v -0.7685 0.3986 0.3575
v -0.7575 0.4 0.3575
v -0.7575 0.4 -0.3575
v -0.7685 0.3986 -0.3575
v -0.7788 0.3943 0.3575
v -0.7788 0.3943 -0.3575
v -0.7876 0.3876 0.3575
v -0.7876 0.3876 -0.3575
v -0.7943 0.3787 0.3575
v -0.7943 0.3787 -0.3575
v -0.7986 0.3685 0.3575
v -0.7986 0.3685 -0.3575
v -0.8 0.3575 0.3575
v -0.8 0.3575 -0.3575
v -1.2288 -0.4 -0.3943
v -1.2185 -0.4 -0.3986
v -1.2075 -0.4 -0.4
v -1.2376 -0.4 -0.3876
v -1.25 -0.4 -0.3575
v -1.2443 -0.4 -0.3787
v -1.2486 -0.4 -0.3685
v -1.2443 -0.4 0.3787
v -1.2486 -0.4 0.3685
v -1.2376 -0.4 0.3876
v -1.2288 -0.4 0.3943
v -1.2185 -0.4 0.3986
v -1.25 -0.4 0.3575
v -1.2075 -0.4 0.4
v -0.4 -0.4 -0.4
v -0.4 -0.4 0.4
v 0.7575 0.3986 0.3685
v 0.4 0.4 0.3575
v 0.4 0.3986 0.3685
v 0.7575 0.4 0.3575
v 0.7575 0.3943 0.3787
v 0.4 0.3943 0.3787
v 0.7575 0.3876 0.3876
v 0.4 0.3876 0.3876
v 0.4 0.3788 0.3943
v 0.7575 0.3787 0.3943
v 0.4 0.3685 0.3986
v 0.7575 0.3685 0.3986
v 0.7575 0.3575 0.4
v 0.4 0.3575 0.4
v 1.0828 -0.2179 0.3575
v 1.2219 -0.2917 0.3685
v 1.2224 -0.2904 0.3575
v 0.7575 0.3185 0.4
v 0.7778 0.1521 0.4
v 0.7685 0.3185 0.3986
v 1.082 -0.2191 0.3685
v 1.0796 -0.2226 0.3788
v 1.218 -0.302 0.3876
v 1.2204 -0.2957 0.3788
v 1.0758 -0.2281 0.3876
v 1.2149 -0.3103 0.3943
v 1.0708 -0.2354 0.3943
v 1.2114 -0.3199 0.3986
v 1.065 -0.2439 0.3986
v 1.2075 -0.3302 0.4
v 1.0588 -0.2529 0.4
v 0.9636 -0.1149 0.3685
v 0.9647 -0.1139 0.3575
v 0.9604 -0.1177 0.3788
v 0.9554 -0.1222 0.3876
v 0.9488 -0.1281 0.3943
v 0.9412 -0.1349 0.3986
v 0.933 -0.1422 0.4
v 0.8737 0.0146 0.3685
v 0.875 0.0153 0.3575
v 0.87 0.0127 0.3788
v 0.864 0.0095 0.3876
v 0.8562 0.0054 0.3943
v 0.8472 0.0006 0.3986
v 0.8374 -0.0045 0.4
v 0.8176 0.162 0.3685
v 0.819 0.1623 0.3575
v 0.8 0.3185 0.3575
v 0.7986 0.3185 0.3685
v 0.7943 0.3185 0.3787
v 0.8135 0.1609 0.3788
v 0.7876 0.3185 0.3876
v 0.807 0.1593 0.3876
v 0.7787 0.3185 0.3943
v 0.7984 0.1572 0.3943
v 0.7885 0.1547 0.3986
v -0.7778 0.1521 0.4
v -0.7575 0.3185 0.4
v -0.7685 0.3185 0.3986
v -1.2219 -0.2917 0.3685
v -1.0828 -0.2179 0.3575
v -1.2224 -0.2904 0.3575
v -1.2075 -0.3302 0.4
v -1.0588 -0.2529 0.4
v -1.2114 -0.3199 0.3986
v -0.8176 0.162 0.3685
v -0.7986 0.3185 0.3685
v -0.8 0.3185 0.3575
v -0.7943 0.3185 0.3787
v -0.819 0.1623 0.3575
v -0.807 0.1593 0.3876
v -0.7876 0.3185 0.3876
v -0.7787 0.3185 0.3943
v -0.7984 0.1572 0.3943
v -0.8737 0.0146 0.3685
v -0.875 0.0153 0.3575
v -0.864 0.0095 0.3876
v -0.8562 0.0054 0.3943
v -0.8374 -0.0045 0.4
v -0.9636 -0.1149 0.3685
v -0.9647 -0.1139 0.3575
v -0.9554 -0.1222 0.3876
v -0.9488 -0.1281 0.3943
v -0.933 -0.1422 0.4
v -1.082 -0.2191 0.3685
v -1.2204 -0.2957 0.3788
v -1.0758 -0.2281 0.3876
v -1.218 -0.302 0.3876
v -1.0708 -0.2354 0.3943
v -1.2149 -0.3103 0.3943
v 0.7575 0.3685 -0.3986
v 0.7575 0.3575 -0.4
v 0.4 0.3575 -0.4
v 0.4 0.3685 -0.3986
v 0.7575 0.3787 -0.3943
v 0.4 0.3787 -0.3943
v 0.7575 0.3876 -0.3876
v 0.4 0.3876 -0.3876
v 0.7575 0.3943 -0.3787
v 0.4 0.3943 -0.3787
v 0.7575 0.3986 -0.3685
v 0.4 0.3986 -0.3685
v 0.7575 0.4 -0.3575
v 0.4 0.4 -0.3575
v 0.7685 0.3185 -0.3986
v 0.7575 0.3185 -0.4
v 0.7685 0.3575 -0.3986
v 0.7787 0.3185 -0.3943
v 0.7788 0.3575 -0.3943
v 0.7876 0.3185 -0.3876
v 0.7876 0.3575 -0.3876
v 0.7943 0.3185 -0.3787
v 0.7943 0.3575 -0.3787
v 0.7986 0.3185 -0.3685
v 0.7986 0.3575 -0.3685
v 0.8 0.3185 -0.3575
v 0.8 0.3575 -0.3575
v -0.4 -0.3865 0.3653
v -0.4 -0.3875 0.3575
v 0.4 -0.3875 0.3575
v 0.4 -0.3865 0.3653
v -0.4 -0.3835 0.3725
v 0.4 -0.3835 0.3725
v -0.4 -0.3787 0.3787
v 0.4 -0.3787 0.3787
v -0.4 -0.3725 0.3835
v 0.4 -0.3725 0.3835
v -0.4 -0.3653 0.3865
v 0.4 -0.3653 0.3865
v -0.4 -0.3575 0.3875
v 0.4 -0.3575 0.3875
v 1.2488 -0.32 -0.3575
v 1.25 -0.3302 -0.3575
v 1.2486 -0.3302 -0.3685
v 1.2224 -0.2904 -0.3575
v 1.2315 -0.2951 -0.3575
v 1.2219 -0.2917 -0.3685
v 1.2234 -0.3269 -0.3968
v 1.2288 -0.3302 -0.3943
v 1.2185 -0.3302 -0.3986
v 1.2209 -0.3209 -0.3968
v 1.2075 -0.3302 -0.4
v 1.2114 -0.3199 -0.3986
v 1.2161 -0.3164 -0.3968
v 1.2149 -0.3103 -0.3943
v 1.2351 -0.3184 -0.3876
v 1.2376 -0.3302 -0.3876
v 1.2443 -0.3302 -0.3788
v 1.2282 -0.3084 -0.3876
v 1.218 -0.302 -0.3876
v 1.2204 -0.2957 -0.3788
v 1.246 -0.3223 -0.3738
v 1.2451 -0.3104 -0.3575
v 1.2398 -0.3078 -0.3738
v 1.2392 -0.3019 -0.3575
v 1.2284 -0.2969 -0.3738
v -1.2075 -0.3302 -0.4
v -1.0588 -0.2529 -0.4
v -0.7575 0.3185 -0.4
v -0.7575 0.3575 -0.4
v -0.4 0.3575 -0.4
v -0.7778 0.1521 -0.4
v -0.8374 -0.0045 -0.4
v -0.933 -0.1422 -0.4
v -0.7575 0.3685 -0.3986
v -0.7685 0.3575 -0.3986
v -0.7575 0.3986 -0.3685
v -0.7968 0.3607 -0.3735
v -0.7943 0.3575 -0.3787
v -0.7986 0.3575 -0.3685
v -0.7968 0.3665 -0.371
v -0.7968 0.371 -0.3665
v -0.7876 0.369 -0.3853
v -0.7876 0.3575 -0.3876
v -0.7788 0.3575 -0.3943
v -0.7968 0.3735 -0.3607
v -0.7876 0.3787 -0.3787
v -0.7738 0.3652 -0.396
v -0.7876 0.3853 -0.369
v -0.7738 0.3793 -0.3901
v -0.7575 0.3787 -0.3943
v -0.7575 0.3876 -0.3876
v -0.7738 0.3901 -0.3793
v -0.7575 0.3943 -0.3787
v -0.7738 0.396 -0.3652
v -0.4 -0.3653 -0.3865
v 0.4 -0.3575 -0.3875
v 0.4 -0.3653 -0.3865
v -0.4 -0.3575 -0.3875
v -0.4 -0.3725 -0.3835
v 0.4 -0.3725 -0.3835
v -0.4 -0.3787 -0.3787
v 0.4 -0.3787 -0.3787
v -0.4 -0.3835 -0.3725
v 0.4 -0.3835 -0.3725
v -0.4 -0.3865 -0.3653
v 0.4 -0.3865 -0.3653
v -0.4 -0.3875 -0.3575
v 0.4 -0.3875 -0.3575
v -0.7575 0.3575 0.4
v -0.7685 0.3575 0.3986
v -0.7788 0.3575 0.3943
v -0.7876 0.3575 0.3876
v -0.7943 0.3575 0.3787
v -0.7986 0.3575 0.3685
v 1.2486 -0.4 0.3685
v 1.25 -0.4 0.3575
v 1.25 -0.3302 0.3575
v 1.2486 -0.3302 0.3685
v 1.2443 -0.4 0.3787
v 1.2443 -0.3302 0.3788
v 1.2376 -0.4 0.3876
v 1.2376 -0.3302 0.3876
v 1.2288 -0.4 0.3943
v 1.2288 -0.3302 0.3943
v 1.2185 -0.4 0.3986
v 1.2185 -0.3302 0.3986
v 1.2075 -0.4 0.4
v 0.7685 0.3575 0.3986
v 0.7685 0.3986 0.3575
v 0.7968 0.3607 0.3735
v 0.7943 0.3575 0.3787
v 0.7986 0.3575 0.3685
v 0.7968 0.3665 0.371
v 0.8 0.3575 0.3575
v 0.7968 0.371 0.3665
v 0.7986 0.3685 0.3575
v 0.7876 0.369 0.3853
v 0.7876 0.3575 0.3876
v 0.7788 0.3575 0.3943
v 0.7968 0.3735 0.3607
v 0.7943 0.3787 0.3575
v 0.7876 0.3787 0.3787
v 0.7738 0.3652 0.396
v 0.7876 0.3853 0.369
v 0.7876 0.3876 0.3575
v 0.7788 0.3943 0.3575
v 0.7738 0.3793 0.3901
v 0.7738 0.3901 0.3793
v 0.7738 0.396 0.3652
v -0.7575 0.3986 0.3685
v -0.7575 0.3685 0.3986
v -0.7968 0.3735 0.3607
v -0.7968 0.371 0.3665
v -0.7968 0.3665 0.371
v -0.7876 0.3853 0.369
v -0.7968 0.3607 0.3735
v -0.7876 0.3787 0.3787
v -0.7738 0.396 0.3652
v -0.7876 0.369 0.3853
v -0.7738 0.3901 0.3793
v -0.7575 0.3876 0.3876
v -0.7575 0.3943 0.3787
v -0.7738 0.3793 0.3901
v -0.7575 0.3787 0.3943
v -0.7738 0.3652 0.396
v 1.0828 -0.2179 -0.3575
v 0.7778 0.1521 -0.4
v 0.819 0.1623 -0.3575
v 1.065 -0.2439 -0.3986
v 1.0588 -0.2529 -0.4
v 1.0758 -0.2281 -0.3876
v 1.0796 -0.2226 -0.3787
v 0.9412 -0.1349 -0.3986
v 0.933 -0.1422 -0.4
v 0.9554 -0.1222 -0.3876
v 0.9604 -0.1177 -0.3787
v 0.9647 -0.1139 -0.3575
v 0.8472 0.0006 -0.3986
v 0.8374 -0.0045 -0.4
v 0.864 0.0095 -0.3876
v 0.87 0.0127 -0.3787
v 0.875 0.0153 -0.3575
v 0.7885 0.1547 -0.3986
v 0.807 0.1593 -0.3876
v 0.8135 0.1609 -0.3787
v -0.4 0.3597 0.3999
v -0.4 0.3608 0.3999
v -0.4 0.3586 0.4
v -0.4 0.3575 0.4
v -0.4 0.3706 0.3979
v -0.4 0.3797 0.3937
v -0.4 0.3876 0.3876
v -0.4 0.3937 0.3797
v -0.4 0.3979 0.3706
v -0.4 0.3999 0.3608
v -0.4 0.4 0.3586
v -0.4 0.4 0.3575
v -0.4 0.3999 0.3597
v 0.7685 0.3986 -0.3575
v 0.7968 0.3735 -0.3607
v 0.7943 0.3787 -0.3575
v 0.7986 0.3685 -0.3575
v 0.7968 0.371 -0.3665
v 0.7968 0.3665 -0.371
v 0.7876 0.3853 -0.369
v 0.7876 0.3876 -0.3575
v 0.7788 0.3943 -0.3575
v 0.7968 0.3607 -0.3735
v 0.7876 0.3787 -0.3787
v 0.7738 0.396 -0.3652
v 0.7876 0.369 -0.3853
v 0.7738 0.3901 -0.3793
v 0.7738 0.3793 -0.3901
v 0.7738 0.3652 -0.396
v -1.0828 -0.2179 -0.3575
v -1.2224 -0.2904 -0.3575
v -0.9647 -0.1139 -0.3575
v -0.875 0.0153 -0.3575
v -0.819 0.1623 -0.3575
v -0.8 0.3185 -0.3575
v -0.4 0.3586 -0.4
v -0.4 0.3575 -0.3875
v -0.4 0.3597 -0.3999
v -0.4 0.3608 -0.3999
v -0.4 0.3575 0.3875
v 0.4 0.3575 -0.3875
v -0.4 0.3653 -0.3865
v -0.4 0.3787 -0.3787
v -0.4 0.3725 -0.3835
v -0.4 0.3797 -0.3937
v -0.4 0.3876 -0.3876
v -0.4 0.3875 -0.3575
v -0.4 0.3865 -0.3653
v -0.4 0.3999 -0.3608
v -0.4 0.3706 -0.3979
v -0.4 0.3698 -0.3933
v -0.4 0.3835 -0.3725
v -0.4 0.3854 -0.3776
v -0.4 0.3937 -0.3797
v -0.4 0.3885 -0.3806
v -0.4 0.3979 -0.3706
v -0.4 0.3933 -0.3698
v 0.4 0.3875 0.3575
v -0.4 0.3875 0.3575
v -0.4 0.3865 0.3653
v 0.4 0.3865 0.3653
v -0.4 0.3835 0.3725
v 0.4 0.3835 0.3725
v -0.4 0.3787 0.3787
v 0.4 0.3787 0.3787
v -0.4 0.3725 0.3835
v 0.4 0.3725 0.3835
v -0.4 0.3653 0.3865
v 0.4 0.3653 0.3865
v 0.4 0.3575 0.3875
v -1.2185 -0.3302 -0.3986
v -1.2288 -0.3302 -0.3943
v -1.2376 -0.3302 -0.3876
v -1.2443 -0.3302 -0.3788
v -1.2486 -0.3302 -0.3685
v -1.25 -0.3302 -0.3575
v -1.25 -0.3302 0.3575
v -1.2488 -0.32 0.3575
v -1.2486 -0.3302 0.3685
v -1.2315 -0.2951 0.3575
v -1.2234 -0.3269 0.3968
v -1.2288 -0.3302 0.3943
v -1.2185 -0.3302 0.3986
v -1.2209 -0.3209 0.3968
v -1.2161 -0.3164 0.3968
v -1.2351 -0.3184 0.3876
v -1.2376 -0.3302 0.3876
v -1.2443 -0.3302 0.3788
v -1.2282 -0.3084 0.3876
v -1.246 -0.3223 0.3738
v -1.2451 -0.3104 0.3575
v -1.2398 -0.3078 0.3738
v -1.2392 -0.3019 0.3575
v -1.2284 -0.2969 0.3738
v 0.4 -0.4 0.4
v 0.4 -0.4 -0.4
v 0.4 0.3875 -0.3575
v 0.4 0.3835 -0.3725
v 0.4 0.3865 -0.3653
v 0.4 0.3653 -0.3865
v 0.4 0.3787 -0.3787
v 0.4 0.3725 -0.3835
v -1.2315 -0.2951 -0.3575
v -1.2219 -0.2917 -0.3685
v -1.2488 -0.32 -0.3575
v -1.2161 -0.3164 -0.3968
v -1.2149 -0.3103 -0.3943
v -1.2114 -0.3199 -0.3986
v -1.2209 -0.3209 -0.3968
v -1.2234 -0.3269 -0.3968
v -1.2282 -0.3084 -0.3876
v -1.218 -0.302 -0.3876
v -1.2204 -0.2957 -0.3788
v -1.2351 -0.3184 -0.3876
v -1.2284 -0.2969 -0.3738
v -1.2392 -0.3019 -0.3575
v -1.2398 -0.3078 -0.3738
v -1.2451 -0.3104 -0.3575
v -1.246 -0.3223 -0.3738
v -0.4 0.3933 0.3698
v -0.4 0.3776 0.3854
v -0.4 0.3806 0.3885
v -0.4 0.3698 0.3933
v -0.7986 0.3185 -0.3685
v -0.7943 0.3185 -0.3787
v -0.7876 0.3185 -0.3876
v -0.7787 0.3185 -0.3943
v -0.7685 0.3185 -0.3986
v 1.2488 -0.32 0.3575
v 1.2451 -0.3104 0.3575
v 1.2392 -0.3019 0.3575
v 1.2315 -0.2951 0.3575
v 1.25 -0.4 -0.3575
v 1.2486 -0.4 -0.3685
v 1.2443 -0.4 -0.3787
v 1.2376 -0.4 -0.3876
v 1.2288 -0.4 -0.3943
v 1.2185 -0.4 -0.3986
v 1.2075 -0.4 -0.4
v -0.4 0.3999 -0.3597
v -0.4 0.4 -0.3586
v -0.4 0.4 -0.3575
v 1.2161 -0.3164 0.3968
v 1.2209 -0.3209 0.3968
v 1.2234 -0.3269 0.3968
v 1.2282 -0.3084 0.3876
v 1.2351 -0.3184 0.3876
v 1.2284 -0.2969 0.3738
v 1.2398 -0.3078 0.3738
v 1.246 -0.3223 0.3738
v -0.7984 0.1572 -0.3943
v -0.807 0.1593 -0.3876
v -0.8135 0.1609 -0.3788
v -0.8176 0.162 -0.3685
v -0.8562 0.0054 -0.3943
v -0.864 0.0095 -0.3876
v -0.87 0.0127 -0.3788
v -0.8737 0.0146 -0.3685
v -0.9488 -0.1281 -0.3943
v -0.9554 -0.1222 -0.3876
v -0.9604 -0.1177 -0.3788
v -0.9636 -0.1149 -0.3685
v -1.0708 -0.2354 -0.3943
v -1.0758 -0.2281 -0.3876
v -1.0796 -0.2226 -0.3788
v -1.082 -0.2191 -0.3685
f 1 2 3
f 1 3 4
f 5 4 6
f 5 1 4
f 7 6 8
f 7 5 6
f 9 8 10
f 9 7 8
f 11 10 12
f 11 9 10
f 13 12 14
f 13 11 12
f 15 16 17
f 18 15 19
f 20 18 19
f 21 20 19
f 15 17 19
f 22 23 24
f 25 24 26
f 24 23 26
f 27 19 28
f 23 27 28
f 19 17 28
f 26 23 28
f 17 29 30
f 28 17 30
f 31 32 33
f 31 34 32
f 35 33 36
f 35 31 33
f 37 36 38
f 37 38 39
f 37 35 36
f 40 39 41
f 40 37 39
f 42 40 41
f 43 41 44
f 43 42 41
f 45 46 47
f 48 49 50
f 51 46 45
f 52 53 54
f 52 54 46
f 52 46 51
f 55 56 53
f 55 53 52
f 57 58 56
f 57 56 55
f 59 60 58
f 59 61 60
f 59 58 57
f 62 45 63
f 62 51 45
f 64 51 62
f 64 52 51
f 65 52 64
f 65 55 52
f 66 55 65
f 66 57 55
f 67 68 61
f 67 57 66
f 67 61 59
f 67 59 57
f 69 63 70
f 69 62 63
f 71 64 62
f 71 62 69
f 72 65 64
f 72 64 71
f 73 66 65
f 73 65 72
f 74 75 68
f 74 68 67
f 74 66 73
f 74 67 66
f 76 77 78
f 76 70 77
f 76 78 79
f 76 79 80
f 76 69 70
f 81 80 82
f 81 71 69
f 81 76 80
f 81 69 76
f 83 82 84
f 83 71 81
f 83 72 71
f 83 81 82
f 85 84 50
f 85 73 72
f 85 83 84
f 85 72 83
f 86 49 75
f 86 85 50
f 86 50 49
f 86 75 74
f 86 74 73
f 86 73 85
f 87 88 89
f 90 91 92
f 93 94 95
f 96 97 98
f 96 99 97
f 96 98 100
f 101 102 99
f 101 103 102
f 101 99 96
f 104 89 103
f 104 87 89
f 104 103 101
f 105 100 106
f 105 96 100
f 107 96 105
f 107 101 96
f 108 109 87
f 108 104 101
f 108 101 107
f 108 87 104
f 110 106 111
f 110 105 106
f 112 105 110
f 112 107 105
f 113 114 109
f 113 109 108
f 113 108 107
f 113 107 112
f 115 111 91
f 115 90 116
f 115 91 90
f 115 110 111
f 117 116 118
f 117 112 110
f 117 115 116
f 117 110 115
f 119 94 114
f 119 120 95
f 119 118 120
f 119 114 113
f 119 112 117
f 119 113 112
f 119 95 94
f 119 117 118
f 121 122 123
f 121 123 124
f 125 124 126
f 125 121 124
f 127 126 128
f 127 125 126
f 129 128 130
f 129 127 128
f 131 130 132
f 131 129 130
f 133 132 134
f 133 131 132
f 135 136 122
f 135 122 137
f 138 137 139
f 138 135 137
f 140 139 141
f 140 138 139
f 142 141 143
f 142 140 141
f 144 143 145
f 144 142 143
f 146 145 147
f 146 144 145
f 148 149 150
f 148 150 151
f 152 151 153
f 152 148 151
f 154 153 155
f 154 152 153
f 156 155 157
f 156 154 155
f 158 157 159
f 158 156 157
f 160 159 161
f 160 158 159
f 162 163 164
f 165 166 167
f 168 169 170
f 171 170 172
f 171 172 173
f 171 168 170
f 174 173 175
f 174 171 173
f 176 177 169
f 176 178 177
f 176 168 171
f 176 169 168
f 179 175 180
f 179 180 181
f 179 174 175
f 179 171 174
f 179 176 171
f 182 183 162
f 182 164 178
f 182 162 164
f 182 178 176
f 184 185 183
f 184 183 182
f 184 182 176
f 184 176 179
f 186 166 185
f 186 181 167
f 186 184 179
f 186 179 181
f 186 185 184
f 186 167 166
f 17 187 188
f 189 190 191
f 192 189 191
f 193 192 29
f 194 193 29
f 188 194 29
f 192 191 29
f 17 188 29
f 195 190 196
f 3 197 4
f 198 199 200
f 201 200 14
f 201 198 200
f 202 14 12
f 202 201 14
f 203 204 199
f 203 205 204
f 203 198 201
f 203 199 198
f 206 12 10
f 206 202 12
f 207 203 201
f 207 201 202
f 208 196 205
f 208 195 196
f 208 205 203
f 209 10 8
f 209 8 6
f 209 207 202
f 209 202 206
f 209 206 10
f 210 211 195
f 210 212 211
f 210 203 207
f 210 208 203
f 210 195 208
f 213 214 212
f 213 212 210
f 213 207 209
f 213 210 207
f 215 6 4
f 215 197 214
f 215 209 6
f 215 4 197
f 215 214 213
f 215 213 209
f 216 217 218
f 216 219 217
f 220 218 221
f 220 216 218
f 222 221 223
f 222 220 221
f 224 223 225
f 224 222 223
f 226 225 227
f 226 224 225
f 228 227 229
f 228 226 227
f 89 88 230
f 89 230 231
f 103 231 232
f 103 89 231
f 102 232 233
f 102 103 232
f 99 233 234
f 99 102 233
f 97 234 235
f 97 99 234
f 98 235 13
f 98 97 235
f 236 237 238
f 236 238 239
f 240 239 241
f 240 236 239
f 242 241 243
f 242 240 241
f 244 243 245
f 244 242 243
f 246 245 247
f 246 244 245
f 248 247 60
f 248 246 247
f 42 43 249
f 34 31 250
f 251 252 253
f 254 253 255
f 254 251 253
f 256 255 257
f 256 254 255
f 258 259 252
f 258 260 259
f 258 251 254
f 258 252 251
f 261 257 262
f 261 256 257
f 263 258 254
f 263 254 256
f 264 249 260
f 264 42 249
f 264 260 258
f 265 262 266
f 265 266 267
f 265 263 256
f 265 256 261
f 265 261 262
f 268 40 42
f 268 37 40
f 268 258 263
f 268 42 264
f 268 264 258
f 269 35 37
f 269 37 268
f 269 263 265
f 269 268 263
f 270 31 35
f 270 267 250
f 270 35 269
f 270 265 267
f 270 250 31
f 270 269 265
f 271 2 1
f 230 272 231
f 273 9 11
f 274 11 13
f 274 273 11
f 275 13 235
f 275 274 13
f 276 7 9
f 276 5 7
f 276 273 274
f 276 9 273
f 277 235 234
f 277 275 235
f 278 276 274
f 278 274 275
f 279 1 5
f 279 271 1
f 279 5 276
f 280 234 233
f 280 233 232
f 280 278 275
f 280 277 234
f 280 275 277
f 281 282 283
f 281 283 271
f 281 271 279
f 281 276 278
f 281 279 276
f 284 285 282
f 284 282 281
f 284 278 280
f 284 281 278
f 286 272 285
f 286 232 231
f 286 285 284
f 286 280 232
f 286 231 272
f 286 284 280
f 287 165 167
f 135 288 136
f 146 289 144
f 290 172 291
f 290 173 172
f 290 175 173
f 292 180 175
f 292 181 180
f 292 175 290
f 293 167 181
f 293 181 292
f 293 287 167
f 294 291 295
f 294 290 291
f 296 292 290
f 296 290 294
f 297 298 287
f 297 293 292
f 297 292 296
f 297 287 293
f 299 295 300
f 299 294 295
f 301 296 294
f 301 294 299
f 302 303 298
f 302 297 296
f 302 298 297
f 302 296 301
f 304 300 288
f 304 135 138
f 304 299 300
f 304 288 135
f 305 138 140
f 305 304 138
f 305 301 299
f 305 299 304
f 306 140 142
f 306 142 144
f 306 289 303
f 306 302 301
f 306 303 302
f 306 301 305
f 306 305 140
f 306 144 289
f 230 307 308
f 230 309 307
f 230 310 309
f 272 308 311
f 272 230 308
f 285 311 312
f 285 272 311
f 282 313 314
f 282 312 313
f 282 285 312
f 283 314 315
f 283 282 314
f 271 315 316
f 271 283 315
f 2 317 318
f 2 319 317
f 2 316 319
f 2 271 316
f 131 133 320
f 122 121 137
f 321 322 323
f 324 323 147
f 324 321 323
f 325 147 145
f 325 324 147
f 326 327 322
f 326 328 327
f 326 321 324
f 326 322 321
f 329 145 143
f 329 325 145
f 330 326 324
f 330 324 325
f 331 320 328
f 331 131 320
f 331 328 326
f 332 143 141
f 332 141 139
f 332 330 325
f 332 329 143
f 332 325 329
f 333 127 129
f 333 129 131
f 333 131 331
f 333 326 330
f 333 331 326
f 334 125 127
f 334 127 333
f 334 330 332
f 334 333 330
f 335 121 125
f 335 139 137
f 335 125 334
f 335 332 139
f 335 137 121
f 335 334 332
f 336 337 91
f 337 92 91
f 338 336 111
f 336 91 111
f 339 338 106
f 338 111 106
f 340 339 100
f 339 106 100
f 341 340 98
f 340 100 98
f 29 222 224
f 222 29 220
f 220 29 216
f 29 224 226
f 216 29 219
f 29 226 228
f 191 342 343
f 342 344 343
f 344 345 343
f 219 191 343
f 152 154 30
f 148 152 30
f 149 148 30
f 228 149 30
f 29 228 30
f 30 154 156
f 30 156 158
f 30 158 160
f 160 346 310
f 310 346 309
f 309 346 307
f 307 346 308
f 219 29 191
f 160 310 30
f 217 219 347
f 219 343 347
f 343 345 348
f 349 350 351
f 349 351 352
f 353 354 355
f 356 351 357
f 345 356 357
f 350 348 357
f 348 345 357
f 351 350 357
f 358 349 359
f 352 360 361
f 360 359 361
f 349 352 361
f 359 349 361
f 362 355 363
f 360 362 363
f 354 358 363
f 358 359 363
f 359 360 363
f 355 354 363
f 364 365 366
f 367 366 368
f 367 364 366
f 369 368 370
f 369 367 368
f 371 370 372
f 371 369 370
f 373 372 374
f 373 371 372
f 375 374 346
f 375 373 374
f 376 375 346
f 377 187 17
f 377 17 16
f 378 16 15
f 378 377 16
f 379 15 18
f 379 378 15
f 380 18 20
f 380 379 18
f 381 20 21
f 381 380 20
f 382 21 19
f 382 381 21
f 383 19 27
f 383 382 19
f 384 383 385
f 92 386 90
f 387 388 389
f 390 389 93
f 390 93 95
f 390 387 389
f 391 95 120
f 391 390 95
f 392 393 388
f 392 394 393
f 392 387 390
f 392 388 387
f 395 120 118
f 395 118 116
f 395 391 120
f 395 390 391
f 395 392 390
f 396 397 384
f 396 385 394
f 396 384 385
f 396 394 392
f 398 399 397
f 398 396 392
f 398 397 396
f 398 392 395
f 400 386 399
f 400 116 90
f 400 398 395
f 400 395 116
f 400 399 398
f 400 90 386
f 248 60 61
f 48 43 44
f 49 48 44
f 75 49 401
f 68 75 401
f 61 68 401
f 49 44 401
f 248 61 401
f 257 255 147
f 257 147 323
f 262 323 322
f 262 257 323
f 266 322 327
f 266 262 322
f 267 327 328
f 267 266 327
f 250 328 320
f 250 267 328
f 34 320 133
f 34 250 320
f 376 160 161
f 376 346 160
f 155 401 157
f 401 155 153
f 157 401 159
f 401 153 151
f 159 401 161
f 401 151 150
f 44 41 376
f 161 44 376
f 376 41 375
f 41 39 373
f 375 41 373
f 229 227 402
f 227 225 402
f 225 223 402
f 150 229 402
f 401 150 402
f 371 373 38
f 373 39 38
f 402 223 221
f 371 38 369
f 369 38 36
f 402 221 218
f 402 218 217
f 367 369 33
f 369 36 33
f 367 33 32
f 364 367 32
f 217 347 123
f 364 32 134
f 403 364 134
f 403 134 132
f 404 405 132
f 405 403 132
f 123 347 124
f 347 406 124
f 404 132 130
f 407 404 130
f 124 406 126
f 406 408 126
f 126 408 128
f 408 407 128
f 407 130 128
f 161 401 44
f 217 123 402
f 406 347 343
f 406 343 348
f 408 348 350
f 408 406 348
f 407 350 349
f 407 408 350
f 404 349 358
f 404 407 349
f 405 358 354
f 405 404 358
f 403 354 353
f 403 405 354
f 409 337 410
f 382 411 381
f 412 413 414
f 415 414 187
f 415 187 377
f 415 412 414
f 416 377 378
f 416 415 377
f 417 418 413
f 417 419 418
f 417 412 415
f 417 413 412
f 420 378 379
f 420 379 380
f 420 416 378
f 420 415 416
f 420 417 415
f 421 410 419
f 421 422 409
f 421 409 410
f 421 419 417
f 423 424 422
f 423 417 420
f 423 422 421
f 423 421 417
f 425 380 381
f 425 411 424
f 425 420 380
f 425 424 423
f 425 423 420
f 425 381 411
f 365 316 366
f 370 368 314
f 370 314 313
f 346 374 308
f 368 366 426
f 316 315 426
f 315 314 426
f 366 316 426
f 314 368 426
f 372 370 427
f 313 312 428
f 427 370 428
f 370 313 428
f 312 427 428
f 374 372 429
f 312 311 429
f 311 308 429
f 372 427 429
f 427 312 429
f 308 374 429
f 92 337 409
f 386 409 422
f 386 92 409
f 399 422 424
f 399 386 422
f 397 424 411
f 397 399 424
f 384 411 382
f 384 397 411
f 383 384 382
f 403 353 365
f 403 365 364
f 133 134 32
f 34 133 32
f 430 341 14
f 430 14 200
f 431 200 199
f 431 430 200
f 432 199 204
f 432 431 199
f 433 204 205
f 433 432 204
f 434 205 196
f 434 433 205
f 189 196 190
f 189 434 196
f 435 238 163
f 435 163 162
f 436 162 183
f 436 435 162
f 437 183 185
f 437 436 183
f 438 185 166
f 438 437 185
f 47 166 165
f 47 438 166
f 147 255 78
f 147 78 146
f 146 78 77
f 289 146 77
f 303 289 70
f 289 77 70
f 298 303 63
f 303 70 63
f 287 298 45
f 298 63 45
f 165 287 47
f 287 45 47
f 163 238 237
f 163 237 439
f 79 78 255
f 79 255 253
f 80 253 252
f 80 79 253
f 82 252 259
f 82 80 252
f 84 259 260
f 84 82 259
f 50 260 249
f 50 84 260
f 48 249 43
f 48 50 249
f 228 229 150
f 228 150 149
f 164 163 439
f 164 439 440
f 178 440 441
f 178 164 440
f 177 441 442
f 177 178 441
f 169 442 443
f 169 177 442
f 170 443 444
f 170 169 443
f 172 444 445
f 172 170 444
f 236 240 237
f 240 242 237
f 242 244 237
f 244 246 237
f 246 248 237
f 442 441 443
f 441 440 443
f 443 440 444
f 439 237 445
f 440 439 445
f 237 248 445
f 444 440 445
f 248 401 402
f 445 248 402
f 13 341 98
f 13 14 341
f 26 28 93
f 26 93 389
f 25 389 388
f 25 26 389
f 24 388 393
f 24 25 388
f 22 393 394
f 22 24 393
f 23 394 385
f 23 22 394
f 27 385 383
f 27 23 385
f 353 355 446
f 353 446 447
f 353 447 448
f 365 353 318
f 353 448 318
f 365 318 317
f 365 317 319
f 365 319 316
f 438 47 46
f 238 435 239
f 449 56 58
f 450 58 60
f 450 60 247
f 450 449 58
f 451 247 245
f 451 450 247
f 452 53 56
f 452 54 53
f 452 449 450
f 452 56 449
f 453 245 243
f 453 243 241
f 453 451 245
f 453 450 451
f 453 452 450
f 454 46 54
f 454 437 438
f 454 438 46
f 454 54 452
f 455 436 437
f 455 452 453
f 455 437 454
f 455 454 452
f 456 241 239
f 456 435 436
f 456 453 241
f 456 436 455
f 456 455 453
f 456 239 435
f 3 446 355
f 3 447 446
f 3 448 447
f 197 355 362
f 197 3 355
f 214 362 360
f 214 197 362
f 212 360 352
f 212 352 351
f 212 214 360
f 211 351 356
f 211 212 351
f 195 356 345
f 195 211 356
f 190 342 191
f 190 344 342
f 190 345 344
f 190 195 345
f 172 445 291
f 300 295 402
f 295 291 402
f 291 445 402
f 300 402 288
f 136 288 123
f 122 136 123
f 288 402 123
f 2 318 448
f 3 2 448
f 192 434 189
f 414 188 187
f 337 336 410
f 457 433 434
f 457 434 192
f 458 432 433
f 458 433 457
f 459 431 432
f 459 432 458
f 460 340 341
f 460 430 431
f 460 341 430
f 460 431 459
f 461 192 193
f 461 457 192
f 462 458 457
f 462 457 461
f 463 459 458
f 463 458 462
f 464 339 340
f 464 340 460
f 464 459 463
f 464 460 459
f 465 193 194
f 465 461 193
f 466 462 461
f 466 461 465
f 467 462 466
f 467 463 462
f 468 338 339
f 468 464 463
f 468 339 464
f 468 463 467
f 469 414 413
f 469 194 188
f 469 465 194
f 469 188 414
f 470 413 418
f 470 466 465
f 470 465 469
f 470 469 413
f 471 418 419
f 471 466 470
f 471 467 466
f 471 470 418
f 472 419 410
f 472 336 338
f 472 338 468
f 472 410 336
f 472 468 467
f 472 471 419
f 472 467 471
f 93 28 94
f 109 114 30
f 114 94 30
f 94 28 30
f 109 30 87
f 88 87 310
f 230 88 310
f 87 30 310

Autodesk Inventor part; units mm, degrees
ref_plane "YZ Plane" through (0, 0, 0) normal (1, 0, 0) x (0, 1, 0)
ref_plane "XZ Plane" through (0, 0, 0) normal (0, 1, 0) x (-1, 0, 0)
ref_plane "XY Plane" through (0, 0, 0) normal (0, 0, 1) x (1, 0, 0)
sketch "Sketch10" plane through (0, 0, 0) normal (0, 0, 1) x (1, 0, 0)
  line L0 (-0.4, 0.3875) -> (0.4, 0.3875)
  line L1 (0.4, 0.3875) -> (0.4, -0.3875)
  line L2 (0.4, -0.3875) -> (-0.4, -0.3875)
  line L3 (-0.4, -0.3875) -> (-0.4, 0.3875)
  point P0 (0, 0)
  point P1 (-0.4, 0)
  point P2 (0, 0.3875)
  dimension "d7" = 0.8
  dimension "d8" = 0.775
extrude "Extrusion4" add sketch "Sketch10" along normal mid plane 0.775
sketch "Sketch11" plane through (0.4, -0.3875, 0.3875) normal (1, 0, 0) x (0, 0, -1)
  line L0 (0, 0.775) -> (0.775, 0.775) construction
  line L1 (0, 0) -> (0, 0.775) construction
  line L2 (0, 0) -> (0.775, 0) construction
  line L3 (0.775, 0.775) -> (0.775, 0) construction
  line L4 (0.7875, 0.7875) -> (-0.0125, 0.7875)
  line L5 (-0.0125, 0.7875) -> (-0.0125, -0.0125)
  line L6 (-0.0125, -0.0125) -> (0.7875, -0.0125)
  line L7 (0.7875, -0.0125) -> (0.7875, 0.7875)
  line L8 (-0.0125, -0.0125) -> (0.7875, -0.0125)
  line L9 (0.7875, -0.0125) -> (0.7875, 0.0875)
  line L10 (0.7875, 0.0875) -> (-0.0125, 0.0875)
  line L11 (-0.0125, 0.0875) -> (-0.0125, -0.0125)
  point P0 (0.3875, 0.3875)
  dimension "d11" = 0.8
  dimension "d14" = 0.1
extrude "Extrusion5" add sketch "Sketch11" along normal blind 0.4
extrude "Extrusion6" add sketch "Sketch11" along normal blind 0.85 contours L7 L6 L5 L10
fillet "Fillet1" radius 0.65 1 edges at (0.8, -0.3, 0)
fillet "Fillet2" radius 0.0425 10 edges at (0.6, 0.4, -0.4) (0.6, 0.4, 0.4) (0.8, 0.3592, 0.4) (0.9244, -0.064, 0.4) (0.8, 0.3592, -0.4) (0.9244, -0.064, -0.4) (1.25, -0.35, -0.4) (1.25, -0.3, 0) (0.8, 0.4, 0) (1.25, -0.35, 0.4)
mirror "Mirror1" about plane through (0, 0, 0) normal (1, 0, 0) of "Extrusion5", "Fillet1", "Fillet2", "Extrusion6"
fillet "Fillet3" radius 0.03 4 edges at (0, 0.3875, -0.3875) (0, 0.3875, 0.3875) (0, -0.3875, -0.3875) (0, -0.3875, 0.3875)
equation "\"d9\" = d8"
properties part number "BLM18PG471SN1D Ferrite Bead" material "Laminate, Ivory, Matte"
